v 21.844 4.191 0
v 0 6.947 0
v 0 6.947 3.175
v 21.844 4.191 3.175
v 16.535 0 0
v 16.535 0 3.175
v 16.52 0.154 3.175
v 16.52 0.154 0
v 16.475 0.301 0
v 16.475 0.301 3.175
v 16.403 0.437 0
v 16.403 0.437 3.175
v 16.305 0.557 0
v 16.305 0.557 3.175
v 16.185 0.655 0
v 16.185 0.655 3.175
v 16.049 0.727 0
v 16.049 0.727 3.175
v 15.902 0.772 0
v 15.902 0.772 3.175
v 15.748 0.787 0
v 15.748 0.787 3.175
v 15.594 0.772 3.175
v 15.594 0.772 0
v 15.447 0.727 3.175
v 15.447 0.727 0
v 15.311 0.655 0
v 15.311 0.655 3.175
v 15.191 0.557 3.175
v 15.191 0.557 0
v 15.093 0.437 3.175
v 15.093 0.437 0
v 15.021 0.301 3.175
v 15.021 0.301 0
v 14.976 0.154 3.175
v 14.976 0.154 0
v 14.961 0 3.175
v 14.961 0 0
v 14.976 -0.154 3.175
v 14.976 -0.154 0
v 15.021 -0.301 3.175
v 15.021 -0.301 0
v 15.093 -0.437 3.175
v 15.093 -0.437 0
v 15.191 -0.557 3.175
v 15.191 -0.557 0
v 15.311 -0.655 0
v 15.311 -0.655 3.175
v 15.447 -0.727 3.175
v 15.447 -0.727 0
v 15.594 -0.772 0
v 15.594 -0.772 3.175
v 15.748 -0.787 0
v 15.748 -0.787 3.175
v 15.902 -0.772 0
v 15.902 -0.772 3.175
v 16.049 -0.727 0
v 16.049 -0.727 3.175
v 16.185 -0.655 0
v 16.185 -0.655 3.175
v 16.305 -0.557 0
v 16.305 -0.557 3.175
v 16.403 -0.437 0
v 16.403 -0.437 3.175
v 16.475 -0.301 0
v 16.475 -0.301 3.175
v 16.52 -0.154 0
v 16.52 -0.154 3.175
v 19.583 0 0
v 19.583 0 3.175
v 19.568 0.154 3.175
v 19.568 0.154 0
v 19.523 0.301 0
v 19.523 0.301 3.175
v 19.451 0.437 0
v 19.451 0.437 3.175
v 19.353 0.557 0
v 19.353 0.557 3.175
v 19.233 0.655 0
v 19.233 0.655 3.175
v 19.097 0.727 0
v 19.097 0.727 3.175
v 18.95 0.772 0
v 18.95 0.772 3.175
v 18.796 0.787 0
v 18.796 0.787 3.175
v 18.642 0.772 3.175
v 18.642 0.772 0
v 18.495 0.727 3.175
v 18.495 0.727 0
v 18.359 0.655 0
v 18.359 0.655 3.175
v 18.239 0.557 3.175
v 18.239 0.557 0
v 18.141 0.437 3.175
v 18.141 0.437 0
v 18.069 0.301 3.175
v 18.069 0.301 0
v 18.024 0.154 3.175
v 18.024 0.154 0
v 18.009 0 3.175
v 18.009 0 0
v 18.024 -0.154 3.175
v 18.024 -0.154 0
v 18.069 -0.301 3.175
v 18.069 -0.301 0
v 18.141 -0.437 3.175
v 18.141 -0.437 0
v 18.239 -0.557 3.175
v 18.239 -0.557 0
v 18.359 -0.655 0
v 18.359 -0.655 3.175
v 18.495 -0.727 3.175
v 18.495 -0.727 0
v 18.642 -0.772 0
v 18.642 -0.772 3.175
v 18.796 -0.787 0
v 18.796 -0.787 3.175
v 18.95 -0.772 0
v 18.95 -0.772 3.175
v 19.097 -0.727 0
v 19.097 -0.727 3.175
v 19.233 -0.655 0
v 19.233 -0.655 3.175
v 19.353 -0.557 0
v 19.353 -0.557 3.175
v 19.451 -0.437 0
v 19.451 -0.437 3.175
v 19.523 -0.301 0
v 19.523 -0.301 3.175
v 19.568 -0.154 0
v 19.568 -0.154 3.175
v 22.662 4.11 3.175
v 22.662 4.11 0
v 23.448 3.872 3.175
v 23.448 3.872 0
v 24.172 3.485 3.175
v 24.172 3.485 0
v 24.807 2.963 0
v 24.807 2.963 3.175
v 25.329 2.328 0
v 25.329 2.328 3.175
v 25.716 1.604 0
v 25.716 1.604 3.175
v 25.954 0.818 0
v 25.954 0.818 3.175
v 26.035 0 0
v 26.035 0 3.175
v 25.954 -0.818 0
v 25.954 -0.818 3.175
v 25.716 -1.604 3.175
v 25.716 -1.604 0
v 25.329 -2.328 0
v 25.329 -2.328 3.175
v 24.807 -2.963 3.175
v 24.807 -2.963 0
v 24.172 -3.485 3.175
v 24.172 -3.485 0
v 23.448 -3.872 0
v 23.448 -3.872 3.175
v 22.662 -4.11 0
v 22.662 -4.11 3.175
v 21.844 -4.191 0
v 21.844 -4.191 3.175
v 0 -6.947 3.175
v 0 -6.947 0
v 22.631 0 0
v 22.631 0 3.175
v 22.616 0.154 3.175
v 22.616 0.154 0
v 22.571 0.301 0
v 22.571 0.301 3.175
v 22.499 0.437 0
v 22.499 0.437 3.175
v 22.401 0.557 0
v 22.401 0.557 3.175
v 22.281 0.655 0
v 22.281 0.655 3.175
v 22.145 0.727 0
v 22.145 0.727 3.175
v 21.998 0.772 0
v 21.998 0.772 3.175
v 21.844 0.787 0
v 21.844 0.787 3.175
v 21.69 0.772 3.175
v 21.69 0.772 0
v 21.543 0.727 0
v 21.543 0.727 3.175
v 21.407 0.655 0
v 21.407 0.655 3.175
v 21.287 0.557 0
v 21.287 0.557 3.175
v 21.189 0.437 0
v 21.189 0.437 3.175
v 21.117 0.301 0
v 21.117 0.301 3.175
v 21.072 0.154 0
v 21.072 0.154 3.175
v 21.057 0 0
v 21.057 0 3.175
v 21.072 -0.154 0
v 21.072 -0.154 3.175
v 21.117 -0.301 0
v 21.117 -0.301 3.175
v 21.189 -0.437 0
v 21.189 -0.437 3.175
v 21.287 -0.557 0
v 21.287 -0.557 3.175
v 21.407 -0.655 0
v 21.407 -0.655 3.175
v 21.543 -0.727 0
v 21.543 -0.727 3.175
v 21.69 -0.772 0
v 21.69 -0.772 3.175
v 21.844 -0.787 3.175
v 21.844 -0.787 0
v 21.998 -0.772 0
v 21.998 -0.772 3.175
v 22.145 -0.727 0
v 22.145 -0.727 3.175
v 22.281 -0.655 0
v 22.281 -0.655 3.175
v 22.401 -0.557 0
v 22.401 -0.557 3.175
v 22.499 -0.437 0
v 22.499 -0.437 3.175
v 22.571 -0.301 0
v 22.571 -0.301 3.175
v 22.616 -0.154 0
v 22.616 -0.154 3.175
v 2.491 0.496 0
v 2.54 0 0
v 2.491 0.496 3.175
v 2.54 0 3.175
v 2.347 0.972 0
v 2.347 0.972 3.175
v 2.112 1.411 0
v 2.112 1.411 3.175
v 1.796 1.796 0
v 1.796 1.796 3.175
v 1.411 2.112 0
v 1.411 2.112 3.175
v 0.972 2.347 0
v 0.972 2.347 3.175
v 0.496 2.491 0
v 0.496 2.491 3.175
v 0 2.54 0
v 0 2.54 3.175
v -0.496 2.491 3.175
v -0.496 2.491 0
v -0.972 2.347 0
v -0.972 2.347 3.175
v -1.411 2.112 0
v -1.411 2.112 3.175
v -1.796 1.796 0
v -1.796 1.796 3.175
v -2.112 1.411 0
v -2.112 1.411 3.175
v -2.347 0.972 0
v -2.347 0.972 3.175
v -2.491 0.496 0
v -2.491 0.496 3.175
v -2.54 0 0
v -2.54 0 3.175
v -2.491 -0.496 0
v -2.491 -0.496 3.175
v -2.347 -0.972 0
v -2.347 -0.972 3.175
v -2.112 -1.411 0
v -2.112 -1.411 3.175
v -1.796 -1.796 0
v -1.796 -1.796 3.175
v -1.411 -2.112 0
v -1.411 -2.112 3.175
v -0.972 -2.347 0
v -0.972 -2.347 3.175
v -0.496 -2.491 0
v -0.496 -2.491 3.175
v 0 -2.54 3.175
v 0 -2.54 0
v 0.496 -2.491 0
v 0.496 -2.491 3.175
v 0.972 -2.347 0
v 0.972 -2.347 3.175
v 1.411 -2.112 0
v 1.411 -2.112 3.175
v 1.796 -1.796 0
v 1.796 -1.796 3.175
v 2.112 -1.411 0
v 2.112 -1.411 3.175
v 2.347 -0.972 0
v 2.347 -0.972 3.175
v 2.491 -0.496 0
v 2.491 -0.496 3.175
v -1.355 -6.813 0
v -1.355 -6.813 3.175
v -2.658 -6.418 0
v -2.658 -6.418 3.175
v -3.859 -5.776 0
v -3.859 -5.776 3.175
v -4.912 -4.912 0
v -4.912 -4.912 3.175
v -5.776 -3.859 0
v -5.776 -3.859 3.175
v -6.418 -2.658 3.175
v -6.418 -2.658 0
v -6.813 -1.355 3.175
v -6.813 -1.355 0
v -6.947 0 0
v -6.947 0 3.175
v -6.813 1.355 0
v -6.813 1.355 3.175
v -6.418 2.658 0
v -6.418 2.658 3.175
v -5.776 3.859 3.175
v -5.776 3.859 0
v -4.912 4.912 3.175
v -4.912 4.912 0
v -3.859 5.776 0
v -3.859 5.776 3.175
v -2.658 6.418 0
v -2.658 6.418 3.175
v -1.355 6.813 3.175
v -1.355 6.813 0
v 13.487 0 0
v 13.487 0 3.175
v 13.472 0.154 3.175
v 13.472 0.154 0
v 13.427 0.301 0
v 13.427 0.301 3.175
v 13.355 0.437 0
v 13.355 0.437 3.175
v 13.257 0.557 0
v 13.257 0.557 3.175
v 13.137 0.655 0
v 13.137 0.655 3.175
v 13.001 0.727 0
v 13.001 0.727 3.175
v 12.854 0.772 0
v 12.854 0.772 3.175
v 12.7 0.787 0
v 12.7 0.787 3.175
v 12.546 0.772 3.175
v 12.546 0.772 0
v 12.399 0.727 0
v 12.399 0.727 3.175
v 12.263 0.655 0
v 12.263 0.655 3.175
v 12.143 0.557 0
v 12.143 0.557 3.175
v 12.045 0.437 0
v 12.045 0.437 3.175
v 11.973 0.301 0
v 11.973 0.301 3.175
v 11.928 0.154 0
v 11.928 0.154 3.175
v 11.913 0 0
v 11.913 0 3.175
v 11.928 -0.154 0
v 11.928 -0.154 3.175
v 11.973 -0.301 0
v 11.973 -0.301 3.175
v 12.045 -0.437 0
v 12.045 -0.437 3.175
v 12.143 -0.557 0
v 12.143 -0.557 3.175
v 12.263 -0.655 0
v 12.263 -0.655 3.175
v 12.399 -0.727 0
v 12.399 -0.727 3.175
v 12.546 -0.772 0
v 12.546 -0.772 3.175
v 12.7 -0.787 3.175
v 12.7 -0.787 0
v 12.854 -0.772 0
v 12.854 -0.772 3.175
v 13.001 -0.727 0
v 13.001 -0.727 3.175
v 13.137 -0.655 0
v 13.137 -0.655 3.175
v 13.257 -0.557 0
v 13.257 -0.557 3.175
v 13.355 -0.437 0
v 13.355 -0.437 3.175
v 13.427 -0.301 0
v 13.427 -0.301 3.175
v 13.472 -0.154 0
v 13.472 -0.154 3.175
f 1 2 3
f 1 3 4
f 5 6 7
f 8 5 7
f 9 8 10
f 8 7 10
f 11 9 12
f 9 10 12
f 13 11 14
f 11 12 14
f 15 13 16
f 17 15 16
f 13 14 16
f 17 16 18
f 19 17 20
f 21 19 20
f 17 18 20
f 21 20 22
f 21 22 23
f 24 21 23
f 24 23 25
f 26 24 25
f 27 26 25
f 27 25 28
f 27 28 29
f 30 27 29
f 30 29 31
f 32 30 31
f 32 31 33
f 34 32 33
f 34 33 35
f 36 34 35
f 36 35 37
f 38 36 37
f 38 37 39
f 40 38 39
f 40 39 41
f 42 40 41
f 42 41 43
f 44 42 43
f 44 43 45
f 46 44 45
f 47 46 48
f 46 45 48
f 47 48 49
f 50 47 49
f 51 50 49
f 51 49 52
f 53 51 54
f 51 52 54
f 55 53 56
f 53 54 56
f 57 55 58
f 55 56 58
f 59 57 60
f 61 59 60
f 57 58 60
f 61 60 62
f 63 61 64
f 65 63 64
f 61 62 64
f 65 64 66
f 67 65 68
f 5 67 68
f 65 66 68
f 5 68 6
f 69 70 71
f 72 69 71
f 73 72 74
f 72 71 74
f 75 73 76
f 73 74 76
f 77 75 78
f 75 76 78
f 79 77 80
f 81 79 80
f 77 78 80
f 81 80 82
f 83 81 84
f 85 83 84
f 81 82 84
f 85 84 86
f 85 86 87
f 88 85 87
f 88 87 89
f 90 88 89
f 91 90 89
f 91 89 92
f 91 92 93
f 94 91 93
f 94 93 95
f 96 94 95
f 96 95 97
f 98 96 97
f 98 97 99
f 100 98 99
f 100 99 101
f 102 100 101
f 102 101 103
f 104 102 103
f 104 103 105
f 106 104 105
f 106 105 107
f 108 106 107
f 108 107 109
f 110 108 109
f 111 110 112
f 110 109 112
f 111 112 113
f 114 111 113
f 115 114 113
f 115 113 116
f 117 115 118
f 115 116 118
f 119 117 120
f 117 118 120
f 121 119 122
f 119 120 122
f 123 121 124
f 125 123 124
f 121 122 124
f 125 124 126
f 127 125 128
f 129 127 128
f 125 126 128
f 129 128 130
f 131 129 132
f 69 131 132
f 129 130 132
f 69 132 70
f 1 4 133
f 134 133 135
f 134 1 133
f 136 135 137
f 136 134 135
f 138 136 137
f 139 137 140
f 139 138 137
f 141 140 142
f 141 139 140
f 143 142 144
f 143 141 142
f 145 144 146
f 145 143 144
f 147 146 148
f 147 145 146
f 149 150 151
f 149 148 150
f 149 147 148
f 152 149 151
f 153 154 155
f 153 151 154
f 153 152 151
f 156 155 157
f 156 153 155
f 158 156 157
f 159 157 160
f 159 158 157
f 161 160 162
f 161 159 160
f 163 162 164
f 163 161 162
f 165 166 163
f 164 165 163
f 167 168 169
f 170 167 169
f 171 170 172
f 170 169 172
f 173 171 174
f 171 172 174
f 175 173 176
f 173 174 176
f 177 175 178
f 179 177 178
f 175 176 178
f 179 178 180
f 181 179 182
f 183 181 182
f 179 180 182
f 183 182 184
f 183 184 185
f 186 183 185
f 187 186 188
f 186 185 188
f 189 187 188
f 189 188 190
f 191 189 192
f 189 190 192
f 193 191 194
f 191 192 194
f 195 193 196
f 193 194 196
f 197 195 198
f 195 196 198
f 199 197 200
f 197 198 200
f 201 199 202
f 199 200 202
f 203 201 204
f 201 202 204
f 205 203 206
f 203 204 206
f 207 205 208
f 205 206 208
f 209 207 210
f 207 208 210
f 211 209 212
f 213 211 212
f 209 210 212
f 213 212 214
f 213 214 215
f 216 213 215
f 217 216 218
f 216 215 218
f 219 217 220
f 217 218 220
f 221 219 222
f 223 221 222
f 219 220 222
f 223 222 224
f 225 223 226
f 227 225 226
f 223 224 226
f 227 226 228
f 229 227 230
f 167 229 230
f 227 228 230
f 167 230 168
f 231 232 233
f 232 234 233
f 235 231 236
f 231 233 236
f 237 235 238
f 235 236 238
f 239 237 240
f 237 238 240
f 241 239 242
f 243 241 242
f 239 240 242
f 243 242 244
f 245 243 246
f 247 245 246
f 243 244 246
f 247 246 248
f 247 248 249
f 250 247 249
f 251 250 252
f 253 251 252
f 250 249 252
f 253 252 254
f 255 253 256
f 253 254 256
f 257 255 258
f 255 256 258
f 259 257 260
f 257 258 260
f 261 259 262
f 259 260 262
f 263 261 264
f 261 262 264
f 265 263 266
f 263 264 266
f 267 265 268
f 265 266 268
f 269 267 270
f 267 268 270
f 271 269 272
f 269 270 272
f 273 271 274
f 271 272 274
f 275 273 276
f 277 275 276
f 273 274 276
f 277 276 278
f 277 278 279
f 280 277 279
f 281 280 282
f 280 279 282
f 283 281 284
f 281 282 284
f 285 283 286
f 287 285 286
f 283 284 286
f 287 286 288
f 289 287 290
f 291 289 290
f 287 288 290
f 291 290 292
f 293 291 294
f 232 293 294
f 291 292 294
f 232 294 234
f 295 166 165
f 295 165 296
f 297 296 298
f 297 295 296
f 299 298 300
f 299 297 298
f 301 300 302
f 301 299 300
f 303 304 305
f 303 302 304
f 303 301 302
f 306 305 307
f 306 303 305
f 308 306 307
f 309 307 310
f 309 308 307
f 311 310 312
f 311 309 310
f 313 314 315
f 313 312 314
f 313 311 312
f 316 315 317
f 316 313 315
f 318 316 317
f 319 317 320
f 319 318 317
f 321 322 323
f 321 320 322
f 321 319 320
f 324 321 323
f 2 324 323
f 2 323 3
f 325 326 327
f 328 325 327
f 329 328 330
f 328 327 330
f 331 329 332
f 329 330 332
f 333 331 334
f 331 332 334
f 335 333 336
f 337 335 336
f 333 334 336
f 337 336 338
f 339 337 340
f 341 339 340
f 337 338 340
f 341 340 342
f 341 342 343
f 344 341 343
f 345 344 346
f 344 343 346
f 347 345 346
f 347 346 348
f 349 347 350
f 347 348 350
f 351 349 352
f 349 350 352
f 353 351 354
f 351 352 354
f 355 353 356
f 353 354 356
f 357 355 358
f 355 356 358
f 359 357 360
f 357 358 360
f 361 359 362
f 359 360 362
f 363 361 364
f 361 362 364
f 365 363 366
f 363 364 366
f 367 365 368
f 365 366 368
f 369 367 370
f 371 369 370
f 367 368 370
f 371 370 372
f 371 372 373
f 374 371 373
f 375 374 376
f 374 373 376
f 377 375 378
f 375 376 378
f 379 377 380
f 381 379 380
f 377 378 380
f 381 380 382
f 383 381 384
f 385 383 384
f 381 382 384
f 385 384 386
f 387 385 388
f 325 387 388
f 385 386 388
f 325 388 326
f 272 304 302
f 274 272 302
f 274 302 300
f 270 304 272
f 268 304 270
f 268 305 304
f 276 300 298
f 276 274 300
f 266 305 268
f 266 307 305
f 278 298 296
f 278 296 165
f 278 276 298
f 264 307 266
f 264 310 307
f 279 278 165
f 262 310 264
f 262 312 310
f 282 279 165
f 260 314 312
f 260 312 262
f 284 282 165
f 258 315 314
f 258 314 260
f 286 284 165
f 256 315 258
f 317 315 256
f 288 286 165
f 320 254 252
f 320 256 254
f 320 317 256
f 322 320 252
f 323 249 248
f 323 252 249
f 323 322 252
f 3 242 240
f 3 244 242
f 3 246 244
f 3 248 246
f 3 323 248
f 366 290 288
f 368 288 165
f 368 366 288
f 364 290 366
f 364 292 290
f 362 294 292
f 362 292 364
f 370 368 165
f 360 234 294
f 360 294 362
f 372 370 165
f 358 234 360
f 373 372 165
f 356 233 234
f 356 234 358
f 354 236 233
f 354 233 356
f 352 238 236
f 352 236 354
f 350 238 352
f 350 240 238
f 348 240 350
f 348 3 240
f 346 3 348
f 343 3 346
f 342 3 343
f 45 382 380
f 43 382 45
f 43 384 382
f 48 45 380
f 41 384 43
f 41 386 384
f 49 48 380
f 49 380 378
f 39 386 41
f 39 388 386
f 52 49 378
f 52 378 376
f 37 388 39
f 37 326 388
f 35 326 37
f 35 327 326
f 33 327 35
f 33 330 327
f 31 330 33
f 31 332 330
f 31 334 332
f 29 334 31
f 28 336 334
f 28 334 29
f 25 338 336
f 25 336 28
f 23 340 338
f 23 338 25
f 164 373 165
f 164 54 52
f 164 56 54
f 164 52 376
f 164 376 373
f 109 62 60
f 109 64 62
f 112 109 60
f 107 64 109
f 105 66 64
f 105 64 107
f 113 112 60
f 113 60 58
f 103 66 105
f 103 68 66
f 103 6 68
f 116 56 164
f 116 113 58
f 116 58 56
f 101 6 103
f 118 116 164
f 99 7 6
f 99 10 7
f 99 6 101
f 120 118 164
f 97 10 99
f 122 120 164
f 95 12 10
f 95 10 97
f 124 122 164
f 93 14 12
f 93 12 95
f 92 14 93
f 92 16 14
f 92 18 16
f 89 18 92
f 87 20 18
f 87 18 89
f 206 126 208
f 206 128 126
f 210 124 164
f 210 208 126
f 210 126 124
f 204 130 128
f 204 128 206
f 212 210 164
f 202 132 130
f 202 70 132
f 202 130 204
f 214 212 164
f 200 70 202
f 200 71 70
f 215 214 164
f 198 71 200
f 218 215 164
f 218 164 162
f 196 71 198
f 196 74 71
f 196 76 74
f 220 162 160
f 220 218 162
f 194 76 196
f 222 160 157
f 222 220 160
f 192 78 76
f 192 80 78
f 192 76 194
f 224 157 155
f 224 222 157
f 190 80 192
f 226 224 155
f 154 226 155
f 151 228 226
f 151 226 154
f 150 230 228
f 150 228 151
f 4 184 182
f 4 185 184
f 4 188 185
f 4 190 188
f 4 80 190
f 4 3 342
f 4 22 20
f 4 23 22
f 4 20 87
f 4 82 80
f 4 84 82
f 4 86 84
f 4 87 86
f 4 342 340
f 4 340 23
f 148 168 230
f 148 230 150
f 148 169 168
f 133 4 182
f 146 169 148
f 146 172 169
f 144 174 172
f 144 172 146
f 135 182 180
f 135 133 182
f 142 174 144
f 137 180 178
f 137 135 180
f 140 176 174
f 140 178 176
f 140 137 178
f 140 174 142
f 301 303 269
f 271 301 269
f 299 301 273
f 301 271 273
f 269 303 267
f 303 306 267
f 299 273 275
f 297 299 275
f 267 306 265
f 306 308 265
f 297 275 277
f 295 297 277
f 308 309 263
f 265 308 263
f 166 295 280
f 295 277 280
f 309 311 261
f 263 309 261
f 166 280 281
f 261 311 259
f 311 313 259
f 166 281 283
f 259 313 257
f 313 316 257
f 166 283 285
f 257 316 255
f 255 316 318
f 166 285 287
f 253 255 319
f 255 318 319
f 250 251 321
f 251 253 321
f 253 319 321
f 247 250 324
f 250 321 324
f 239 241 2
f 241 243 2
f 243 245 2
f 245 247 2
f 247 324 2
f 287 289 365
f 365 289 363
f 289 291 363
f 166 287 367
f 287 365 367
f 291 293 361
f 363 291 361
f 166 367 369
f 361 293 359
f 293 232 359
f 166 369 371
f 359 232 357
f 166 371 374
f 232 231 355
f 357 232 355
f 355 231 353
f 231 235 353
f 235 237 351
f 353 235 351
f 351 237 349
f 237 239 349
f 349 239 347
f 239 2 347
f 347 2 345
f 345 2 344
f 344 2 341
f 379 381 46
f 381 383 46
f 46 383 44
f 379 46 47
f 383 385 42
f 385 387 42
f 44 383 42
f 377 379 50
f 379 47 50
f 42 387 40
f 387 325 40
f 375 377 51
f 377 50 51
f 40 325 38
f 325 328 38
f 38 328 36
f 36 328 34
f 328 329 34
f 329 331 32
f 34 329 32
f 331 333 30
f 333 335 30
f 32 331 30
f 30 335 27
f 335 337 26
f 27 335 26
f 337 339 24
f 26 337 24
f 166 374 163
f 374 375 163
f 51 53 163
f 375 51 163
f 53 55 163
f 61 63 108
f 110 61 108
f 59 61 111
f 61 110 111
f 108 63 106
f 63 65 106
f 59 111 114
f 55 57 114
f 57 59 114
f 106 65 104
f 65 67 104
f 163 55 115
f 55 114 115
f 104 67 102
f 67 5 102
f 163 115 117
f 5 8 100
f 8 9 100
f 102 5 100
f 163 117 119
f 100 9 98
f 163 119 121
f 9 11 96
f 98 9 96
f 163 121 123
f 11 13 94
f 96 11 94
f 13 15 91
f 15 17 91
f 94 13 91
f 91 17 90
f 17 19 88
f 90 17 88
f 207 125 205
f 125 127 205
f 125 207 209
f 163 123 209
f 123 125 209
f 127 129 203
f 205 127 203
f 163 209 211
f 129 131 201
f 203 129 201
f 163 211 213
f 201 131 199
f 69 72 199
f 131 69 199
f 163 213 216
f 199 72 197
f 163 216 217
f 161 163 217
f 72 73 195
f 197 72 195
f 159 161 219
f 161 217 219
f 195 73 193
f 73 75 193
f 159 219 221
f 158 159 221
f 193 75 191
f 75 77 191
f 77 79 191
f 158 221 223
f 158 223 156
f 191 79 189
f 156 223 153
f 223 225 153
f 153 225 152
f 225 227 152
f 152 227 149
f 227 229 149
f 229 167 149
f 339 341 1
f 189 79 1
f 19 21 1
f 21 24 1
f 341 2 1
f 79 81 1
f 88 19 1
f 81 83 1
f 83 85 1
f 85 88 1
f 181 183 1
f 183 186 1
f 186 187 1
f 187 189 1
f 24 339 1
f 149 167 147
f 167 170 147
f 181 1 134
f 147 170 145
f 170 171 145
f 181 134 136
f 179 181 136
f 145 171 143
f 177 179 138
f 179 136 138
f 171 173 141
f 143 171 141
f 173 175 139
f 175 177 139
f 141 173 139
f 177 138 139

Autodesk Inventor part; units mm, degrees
ref_plane "YZ Plane" through (0, 0, 0) normal (1, 0, 0) x (0, 1, 0)
ref_plane "XZ Plane" through (0, 0, 0) normal (0, 1, 0) x (-1, 0, 0)
ref_plane "XY Plane" through (0, 0, 0) normal (0, 0, 1) x (1, 0, 0)
sketch "Sketch1" plane through (0, 0, 0) normal (0, 0, 1) x (1, 0, 0)
  circle A0 centre (0, 0) radius 6.9469
  circle A1 centre (21.844, 0) radius 4.191
  line L0 (0, 6.9469) -> (21.844, 4.191)
  line L1 (0, -6.9469) -> (21.844, -4.191)
  dimension "d0" = 13.8938
  dimension "d1" = 8.382
  dimension "d2" = 21.844
extrude "Extrusion1" add sketch "Sketch1" along normal blind 3.175 contours L0 A0 L1 | L0 A1 L1 A0 | A1
sketch "Sketch2" plane through (0, 0, 3.175) normal (0, 0, 1) x (1, 0, 0)
  circle A0 centre (0, 0) radius 2.54
  circle A1 centre (12.7, 0) radius 0.7874
  circle A2 centre (15.748, 0) radius 0.7874
  circle A3 centre (18.796, 0) radius 0.7874
  circle A4 centre (21.844, 0) radius 0.7874
  dimension "d5" = 5.08
  dimension "d6" = 1.5748
  dimension "d7" = 1.5748
  dimension "d8" = 1.5748
  dimension "d9" = 1.5748
  dimension "d10" = 12.7
  dimension "d11" = 15.748
  dimension "d12" = 18.796
  dimension "d13" = 21.844
extrude "Extrusion2" cut sketch "Sketch2" against normal blind 3.175
properties part number "Servo horn"
